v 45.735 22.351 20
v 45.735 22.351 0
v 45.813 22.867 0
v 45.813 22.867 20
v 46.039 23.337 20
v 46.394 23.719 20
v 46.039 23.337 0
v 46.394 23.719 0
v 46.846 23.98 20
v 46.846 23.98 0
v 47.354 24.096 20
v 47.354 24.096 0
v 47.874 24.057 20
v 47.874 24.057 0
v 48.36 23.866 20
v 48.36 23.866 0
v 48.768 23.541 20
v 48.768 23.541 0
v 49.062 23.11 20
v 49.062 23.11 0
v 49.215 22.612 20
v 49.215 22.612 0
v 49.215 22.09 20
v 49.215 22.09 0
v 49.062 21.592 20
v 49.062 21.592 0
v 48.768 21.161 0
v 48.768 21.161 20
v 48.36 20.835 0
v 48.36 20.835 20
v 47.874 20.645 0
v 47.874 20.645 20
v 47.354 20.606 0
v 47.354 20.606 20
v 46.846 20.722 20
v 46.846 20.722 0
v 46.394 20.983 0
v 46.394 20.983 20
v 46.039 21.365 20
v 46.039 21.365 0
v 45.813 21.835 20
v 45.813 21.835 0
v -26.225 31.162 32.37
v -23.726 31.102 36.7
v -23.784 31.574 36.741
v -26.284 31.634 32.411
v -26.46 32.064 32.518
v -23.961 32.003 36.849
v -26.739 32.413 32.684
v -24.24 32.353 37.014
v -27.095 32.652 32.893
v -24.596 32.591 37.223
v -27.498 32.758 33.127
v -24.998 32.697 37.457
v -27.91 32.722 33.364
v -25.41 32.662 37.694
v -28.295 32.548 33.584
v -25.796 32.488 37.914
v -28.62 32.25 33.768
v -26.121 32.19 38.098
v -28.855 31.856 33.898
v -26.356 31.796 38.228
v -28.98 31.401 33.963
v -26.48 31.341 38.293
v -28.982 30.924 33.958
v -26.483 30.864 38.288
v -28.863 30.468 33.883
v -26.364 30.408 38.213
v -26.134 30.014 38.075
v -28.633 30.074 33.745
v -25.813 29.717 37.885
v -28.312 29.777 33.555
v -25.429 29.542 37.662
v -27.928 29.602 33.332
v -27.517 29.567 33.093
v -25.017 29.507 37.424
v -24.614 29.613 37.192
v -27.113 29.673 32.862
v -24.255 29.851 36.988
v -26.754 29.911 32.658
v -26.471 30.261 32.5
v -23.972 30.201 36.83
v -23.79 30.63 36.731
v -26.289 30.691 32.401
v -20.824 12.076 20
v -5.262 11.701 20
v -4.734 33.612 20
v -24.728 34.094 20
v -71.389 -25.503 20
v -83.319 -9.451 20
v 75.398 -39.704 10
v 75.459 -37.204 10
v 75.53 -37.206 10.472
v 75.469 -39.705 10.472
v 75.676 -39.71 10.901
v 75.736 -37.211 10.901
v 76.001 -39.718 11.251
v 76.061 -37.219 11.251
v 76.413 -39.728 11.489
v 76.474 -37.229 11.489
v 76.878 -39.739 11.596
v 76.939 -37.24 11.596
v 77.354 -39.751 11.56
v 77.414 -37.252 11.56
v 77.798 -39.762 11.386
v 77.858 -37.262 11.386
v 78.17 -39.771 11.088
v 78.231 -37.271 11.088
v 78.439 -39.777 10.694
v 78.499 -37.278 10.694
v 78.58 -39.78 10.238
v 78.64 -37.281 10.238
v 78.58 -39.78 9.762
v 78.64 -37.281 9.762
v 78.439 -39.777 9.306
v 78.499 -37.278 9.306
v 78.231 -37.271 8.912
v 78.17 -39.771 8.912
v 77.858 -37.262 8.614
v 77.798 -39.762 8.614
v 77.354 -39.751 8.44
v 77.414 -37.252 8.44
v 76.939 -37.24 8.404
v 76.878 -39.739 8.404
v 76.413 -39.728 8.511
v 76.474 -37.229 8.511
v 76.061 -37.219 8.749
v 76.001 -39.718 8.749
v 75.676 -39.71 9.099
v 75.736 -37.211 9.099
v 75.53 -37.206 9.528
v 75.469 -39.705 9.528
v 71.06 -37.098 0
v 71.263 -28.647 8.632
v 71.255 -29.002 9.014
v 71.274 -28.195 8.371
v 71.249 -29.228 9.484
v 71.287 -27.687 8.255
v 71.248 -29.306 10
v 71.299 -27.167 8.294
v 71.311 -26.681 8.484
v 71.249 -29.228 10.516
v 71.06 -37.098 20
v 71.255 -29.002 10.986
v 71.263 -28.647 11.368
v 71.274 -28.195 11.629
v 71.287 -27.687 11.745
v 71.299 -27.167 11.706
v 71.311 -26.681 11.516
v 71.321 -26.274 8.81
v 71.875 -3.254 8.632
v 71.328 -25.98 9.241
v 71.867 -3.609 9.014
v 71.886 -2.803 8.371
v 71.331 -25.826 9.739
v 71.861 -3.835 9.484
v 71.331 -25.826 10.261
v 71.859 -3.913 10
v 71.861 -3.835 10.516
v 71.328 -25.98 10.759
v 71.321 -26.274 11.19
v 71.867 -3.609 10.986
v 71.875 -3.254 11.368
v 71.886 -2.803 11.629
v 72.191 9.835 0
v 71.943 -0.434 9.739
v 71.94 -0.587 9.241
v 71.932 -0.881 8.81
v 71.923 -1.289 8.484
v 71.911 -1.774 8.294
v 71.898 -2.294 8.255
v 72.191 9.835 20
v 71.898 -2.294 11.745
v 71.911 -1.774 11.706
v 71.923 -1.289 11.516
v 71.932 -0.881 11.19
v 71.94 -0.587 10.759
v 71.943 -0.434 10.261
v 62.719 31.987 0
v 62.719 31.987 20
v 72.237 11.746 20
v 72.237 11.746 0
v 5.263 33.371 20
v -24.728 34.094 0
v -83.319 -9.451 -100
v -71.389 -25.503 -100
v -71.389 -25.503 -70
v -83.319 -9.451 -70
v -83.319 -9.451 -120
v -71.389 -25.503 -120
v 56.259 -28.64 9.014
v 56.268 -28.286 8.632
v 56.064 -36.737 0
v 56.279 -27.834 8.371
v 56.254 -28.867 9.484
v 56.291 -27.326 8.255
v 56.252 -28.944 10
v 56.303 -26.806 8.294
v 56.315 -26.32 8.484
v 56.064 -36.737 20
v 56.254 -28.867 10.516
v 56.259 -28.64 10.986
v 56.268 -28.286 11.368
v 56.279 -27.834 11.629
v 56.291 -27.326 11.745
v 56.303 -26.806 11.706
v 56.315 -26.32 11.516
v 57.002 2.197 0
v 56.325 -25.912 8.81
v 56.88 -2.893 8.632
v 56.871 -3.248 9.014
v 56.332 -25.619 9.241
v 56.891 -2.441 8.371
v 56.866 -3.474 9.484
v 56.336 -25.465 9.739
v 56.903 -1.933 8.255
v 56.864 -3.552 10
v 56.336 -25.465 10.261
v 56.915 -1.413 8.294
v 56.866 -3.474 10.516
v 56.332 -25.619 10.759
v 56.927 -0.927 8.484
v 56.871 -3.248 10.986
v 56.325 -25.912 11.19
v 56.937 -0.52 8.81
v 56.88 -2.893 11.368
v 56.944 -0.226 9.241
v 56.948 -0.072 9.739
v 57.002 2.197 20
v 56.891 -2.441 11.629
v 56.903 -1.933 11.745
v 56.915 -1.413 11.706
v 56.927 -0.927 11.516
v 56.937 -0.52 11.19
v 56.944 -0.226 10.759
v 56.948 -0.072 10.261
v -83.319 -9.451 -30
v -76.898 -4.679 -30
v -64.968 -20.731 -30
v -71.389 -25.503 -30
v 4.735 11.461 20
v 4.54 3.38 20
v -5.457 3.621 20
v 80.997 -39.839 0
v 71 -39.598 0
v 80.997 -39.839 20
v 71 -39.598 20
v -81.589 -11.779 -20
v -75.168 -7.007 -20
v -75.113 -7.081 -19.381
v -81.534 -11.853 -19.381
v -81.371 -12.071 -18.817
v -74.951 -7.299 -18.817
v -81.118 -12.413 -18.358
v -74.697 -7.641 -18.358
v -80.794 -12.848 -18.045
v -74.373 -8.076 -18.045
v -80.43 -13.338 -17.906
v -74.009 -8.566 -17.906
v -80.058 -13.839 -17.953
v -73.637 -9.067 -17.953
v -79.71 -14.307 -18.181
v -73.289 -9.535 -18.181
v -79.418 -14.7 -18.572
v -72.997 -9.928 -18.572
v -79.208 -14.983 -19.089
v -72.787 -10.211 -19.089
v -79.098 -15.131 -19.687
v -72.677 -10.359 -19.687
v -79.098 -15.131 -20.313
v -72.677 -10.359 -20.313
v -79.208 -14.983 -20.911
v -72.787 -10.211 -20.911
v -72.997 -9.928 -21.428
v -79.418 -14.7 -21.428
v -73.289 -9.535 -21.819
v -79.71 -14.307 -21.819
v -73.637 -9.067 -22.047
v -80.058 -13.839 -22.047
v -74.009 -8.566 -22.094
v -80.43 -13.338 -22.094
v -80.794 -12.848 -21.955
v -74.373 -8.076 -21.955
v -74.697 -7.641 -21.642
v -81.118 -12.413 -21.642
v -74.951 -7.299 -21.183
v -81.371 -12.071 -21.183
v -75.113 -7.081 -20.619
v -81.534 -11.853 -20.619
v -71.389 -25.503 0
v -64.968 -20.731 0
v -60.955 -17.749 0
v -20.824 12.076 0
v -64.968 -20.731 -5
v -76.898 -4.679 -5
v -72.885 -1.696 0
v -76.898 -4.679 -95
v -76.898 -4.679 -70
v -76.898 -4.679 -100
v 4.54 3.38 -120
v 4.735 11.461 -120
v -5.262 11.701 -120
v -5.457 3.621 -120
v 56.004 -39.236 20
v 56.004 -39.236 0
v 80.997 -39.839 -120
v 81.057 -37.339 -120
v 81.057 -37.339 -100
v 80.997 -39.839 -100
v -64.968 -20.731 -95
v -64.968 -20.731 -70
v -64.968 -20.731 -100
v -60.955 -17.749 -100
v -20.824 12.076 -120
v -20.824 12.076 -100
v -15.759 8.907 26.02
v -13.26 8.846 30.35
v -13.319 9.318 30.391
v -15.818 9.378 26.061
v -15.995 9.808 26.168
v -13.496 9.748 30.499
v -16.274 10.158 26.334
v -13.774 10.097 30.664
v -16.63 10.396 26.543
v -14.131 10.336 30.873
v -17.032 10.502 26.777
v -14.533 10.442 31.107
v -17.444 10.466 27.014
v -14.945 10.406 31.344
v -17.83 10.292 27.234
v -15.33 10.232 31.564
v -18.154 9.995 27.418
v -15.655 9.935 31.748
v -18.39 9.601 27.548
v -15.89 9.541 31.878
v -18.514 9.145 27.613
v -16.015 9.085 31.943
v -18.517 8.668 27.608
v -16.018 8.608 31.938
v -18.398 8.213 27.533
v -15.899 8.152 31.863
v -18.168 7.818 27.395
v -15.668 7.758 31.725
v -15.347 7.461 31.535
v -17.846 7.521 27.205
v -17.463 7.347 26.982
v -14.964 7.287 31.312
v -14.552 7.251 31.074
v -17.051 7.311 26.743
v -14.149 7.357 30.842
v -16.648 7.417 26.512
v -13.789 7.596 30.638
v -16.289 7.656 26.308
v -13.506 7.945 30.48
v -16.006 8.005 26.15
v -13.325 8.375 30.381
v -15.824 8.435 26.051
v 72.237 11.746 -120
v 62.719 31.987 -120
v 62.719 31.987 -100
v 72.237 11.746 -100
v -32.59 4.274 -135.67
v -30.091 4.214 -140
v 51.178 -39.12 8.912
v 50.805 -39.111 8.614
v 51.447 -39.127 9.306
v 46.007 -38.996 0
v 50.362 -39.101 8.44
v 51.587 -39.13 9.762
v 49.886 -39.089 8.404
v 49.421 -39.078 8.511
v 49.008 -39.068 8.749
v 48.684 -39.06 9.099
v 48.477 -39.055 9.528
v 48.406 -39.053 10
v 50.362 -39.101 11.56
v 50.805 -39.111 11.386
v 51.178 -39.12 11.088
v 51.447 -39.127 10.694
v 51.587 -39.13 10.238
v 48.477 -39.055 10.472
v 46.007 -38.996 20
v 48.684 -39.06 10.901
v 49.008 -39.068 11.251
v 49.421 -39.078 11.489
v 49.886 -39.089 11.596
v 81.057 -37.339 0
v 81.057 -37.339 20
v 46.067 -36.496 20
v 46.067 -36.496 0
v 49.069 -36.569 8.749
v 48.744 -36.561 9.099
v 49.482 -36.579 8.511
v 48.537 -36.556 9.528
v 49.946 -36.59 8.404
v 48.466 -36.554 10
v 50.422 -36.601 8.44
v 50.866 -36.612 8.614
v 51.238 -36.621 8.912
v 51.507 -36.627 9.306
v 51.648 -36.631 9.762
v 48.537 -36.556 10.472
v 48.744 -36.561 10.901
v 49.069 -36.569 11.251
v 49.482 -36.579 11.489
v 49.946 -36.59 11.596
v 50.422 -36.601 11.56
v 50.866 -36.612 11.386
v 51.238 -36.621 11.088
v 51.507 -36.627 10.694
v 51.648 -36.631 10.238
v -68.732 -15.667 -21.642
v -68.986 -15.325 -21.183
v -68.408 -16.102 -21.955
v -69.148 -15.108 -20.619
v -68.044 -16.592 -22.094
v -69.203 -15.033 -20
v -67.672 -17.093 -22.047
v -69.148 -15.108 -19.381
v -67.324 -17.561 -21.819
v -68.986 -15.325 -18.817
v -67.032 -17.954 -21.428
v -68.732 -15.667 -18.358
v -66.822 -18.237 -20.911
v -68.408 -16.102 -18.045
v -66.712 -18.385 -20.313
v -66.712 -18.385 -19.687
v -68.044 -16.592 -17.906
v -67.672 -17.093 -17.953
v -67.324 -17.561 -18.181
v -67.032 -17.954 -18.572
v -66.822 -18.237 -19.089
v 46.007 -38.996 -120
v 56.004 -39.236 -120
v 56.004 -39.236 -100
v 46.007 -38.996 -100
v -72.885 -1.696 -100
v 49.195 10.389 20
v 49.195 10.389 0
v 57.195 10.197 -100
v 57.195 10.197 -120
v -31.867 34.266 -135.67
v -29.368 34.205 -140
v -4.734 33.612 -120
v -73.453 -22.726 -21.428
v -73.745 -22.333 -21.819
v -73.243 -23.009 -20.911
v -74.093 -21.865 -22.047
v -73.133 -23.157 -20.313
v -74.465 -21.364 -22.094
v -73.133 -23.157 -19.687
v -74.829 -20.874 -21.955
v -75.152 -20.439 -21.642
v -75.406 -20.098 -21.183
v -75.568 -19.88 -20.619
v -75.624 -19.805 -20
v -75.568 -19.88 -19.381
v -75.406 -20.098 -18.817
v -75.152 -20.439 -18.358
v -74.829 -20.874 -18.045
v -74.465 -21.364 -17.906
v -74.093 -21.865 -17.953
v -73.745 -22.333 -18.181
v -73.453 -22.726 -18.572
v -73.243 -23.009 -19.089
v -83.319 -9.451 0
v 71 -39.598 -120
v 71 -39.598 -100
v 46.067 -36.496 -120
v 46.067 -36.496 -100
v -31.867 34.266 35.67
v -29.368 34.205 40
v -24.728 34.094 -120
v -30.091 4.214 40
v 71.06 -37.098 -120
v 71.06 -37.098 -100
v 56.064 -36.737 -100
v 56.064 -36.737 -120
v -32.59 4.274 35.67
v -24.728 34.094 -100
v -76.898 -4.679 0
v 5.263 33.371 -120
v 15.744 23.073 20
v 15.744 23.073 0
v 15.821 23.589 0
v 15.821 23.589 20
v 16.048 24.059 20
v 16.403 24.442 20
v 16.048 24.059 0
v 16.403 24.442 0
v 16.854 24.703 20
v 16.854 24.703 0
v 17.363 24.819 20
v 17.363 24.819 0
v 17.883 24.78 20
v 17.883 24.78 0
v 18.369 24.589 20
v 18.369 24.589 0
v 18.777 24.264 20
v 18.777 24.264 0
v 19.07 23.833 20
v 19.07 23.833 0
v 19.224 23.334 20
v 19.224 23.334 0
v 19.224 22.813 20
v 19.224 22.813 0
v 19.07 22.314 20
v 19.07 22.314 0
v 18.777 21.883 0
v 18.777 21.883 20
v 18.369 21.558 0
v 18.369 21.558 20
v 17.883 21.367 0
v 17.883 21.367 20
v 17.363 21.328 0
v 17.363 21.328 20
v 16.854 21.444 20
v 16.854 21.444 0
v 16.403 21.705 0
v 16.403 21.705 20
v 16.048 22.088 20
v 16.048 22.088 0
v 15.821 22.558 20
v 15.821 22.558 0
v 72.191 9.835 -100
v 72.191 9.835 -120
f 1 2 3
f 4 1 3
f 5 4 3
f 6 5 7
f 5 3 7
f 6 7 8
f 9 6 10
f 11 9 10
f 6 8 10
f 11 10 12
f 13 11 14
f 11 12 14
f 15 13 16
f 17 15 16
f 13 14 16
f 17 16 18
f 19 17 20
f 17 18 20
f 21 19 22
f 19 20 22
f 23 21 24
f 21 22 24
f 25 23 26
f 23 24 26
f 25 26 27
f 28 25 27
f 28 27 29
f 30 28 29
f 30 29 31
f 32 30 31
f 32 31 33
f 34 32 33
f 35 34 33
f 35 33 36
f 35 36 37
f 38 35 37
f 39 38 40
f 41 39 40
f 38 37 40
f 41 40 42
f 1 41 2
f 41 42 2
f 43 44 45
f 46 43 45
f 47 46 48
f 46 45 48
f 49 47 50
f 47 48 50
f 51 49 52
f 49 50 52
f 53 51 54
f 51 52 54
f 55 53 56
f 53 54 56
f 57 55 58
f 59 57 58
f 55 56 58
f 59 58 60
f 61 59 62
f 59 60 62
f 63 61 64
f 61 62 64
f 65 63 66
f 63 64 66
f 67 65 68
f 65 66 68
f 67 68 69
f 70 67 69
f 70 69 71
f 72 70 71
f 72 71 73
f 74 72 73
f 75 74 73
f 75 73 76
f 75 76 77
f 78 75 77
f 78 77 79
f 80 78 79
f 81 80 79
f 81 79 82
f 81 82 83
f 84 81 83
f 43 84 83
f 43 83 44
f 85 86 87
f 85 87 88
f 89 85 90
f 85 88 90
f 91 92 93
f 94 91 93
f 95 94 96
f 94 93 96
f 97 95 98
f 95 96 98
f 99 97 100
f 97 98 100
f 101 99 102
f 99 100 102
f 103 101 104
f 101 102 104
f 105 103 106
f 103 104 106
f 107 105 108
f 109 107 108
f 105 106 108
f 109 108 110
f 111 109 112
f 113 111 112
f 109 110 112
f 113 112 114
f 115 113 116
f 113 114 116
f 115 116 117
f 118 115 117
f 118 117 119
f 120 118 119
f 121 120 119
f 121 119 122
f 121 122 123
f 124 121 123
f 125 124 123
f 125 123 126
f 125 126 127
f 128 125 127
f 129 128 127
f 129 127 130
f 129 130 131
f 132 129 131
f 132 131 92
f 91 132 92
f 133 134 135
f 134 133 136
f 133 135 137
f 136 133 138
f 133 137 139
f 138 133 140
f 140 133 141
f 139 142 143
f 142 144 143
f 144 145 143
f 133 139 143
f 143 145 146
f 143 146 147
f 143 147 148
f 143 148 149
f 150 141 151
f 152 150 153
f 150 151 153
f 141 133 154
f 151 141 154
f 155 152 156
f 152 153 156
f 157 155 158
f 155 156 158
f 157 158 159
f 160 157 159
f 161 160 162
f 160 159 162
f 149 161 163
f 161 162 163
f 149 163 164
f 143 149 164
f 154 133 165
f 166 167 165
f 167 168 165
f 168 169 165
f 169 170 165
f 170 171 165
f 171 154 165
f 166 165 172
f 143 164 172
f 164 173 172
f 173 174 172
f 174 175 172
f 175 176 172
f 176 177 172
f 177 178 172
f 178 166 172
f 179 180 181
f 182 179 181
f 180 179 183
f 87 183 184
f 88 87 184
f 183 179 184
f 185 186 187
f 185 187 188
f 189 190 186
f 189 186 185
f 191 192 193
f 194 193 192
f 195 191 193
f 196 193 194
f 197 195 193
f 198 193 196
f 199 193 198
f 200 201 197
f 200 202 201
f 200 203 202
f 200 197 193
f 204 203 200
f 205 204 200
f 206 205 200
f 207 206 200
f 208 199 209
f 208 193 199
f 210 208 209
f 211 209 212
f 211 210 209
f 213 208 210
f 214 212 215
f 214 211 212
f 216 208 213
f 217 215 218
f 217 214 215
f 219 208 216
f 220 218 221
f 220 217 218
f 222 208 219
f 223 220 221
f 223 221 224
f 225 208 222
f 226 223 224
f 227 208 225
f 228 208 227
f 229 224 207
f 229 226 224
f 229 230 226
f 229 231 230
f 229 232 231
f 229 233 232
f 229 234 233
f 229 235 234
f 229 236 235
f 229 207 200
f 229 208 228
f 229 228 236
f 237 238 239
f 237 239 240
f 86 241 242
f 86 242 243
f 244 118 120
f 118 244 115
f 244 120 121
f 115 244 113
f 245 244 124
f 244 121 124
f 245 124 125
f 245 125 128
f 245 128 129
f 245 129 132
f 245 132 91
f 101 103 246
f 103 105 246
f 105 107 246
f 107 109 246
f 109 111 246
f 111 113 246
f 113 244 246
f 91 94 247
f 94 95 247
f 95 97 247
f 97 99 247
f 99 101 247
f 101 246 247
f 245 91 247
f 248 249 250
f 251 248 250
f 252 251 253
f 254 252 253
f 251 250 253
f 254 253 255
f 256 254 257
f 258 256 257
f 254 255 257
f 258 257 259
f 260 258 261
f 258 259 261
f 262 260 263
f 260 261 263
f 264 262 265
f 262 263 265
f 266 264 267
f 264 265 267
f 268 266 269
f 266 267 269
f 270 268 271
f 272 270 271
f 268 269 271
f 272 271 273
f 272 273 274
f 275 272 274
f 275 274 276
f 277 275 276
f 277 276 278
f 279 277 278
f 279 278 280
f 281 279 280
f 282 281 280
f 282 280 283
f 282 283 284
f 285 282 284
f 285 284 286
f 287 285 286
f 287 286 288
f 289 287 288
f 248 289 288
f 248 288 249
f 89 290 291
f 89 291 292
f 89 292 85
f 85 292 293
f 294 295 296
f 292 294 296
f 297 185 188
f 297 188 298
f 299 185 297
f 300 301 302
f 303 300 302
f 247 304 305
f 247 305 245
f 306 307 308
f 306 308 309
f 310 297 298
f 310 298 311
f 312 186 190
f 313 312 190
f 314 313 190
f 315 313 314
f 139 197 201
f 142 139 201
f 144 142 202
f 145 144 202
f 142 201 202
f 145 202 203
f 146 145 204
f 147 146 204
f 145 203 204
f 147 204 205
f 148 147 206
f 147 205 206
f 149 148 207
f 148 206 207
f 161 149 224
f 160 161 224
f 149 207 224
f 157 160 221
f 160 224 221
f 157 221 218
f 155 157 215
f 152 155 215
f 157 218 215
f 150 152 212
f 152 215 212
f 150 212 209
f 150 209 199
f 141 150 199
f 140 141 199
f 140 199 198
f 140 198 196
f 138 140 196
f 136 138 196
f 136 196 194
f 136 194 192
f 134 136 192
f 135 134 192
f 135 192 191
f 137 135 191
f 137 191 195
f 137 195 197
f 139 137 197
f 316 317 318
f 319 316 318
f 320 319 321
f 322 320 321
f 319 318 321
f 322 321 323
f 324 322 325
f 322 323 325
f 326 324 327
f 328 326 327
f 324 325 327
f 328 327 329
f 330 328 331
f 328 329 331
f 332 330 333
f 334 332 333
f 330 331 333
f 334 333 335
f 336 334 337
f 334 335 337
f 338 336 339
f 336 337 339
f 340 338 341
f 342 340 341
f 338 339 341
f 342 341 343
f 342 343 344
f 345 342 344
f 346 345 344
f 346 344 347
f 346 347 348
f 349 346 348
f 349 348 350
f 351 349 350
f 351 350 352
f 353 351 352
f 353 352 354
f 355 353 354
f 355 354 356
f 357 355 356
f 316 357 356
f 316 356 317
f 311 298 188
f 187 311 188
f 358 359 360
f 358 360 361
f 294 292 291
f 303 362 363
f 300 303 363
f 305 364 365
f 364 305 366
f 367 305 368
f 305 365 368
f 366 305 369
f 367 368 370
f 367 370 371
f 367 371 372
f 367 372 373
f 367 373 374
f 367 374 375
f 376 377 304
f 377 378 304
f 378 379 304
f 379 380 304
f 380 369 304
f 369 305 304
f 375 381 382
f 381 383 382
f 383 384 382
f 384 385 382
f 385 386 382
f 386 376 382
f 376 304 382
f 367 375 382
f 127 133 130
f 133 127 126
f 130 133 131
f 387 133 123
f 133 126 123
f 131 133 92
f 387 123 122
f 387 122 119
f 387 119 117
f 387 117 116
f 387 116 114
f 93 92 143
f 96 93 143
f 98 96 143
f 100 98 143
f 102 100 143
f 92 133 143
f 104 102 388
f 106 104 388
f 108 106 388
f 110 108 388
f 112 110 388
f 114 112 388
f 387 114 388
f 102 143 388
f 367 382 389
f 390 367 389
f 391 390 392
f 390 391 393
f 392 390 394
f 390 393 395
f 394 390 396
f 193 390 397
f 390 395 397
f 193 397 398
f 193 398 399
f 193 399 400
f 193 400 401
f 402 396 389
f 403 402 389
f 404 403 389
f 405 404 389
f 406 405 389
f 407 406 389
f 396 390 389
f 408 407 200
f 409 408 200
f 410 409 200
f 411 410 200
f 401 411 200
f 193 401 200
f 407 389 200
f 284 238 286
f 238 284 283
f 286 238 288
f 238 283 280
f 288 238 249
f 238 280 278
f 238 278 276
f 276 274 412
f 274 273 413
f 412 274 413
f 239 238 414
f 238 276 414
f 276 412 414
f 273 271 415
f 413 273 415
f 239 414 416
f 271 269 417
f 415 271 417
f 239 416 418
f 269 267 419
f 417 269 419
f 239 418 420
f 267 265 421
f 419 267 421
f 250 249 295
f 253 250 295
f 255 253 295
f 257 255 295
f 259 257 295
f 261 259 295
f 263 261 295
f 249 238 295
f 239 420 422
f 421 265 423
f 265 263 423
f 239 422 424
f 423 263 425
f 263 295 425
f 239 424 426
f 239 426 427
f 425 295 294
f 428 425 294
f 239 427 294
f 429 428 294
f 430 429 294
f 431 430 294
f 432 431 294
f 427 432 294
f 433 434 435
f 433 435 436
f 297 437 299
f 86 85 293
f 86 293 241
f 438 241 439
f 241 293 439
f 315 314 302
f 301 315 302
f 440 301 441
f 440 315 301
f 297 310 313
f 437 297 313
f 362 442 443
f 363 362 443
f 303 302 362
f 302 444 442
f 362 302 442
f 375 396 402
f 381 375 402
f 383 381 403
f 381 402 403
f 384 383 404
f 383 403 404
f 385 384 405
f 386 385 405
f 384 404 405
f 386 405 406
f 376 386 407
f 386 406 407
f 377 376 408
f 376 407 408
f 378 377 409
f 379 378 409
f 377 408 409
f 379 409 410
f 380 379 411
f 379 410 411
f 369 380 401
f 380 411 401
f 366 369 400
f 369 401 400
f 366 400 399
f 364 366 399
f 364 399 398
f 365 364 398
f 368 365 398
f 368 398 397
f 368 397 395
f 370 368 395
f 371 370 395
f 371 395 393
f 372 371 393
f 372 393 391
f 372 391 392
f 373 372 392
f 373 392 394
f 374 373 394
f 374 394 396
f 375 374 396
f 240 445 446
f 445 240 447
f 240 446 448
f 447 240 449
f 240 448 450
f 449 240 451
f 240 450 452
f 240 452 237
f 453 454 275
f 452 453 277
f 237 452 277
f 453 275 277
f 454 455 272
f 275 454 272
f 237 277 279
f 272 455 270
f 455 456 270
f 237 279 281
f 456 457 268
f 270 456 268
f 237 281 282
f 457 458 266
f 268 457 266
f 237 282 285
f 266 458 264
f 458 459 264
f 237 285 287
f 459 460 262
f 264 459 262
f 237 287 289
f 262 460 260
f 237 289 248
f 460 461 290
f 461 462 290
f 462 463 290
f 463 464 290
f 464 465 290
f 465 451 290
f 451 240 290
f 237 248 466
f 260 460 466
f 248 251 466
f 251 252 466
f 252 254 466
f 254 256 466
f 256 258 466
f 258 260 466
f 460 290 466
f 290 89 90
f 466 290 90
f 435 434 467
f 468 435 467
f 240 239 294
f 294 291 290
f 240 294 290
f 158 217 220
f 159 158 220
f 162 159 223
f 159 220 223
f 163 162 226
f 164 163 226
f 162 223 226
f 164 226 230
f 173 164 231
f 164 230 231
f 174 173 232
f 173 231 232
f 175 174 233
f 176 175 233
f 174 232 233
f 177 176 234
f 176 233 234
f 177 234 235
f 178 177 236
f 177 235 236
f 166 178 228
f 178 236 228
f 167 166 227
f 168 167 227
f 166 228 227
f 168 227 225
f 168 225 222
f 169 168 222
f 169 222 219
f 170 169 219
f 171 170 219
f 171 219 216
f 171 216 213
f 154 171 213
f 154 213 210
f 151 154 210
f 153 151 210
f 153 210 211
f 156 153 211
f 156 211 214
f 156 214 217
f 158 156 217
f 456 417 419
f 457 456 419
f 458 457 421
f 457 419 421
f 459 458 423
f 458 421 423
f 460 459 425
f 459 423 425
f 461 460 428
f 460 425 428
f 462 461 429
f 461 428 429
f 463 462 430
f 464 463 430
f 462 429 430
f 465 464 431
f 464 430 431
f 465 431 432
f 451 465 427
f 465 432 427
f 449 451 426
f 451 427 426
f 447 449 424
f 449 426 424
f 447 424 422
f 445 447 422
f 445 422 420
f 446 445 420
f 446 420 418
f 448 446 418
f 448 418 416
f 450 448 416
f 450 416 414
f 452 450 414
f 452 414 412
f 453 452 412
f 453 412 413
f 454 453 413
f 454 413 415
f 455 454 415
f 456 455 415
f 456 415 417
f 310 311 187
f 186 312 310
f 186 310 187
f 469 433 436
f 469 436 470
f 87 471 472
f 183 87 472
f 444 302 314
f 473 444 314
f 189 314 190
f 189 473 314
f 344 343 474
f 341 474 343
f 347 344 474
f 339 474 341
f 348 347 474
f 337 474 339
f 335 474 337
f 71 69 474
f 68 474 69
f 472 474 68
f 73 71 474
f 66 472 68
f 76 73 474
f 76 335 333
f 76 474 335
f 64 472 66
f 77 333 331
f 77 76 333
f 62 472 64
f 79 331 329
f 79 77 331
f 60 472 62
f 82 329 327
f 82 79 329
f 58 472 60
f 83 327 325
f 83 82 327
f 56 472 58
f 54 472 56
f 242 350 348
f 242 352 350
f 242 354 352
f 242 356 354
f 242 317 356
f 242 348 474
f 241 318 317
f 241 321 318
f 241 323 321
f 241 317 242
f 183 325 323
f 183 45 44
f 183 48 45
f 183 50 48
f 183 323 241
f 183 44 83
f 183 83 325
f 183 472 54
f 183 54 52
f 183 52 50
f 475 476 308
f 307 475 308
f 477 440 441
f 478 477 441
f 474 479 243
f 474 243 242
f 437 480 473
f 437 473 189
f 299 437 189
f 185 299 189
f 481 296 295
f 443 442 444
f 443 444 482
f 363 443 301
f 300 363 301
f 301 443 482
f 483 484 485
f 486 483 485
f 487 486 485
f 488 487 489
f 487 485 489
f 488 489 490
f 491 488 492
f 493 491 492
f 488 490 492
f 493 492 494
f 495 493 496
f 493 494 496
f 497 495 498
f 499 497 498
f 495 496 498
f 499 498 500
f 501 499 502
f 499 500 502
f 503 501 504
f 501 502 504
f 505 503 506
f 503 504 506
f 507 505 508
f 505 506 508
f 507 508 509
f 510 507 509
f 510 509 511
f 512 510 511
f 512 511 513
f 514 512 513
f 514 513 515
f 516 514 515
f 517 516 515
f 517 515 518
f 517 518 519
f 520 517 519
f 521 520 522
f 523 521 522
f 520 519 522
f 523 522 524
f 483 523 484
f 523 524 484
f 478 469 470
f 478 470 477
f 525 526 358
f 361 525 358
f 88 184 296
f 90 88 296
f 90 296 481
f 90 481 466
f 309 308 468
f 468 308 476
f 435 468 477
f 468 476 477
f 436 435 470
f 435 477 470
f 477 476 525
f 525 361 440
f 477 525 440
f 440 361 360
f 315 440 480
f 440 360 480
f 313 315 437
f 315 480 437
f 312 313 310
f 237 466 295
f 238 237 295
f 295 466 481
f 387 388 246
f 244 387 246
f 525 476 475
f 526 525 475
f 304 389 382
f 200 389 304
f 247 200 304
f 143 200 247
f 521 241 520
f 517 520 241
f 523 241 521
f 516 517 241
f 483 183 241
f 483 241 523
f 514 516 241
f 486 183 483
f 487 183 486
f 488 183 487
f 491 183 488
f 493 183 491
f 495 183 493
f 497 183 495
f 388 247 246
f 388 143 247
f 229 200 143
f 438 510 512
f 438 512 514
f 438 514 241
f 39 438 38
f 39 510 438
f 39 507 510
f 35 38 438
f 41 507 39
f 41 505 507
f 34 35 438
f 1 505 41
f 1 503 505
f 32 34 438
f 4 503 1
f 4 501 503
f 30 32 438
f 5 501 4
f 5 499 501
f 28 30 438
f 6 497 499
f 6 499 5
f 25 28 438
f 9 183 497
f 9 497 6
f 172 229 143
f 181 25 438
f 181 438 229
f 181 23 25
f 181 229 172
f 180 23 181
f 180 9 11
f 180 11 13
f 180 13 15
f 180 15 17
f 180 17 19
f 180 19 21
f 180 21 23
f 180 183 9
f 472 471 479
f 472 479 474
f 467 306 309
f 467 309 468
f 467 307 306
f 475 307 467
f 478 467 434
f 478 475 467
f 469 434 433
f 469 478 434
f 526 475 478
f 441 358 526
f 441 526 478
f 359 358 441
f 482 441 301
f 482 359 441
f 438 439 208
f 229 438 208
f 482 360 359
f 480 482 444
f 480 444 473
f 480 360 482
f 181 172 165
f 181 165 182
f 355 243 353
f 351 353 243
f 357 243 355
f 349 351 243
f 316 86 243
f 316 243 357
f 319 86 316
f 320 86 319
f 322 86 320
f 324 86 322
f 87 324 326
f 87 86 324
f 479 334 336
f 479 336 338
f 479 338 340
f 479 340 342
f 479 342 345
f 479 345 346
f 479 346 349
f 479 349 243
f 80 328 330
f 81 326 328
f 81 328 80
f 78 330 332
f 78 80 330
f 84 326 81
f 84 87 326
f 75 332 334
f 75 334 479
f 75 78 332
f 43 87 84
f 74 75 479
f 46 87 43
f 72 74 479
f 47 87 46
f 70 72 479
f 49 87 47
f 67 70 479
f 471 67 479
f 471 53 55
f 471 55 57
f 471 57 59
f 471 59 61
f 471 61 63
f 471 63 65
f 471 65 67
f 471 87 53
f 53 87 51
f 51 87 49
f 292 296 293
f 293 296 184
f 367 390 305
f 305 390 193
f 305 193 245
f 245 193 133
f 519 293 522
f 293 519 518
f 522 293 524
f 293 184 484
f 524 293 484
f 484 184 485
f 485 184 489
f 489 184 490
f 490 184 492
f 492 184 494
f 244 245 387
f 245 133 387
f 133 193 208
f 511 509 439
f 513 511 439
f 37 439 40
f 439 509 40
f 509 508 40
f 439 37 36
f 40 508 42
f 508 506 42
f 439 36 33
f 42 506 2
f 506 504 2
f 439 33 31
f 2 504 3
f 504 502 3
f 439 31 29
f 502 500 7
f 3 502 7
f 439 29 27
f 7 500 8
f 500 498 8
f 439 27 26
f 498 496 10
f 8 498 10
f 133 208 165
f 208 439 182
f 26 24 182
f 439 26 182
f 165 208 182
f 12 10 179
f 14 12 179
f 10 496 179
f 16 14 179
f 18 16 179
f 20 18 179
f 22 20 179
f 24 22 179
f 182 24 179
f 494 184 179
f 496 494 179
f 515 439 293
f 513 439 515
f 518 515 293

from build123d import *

# Parameters (mm, degrees)
EXTRUDE_1_DEPTH     = 20
EXTRUDE_2_DEPTH     = 30
EXTRUDE_3_DEPTH     = 20
SKETCH_4_W          = 15
SKETCH_4_H          = 20
EXTRUDE_4_DEPTH     = 49.447425698
EXTRUDE_5_DEPTH     = 20
CUT_EXTRUDE_1_DEPTH = 30
EXTRUDE_6_DEPTH     = 30
EXTRUDE_7_DEPTH     = 20
SKETCH_9_R          = 1.6
CUT_EXTRUDE_2_DEPTH = 10
SKETCH_10_R         = 2.1
CUT_EXTRUDE_3_DEPTH = 10
SKETCH_11_R         = 1.75
CUT_EXTRUDE_4_DEPTH = 202.855572154
SKETCH_12_R         = 1.6
CUT_EXTRUDE_5_DEPTH = 10
SKETCH_13_R         = 1.75
CUT_EXTRUDE_7_DEPTH = 20


with BuildPart() as part:
    # 草图1 → 凸台-拉伸1 (new body)
    with BuildSketch(Plane.XY):
        Polygon((-24.728355126, 34.093691019), (-83.319008043, -9.450945744), (-71.388970574, -25.50317942), (-20.824434495, 12.076438608), (72.190663405, 9.835314871), (72.718578523, 31.745785774), align=None)
    extrude(amount=EXTRUDE_1_DEPTH)

    # 草图2 → 凸台-拉伸2 (add)
    with BuildSketch(Plane(origin=(0, 0, 0), x_dir=(-1, 0, 0), z_dir=(0, 0, -1))):
        Polygon((71.388970574, -25.50317942), (83.319008043, -9.450945744), (76.898114573, -4.678930756), (64.968077103, -20.731164432), align=None)
    extrude(amount=EXTRUDE_2_DEPTH)

    # 草图3 → 凸台-拉伸3 (add)
    with BuildSketch(Plane(origin=(-25.121381082, 33.801593702, 0), x_dir=(0.8026116837907572, 0.5965018734610694, 0), z_dir=(-0.5965018734610694, 0.8026116837907572, 0))):
        Polygon((-64.510316179, 5), (-59.510316179, 0), (-64.510316179, 0), align=None)
    extrude(amount=-EXTRUDE_3_DEPTH)

    # 草图4 → 凸台-拉伸4 (add)
    with BuildSketch(Plane(origin=(0.278721027, 11.567975102, 0), x_dir=(0.9997098612470757, -0.024087202522351275, 0), z_dir=(-0.024087202522351272, -0.9997098612470756, 0))):
        with Locations((64.432812874, 10)):
            Rectangle(SKETCH_4_W, SKETCH_4_H)
    extrude(amount=EXTRUDE_4_DEPTH)

    # 草图5 → 凸台-拉伸5 (add)
    with BuildSketch(Plane.XY.offset(20)):
        Polygon((46.006866716, -38.99558415), (46.067084723, -36.496309497), (81.056929866, -37.339361585), (80.99671186, -39.838636238), align=None)
    extrude(amount=-EXTRUDE_5_DEPTH)

    # 草图6 → 切除-拉伸1 (cut)
    with BuildSketch(Plane.XY.offset(20)):
        Polygon((62.718578523, 31.986727706), (72.23669466, 11.745785774), (72.718578523, 31.745785774), align=None)
    extrude(amount=-CUT_EXTRUDE_1_DEPTH, mode=Mode.SUBTRACT)

    # 草图7 → 凸台-拉伸6 (add)
    with BuildSketch(Plane(origin=(0.806636145, 33.478446006, 0), x_dir=(0.9997098612470757, -0.02408720252235126, 0), z_dir=(0.024087202522351258, 0.9997098612470756, 0))):
        Polygon((-5.542402112, -20), (-32.683418264, -35.669872981), (-30.183418264, -40), (4.457597888, -20), align=None)
    extrude(amount=-EXTRUDE_6_DEPTH)


with BuildPart() as body_2:
    # 镜向4: mirrored copy
    add(part.part.mirror(Plane(origin=(0, 0, -50), x_dir=(1, 0, 0), z_dir=(0, 0, -1))))


with BuildPart() as part_1:
    add(part.part)

    # 草图8 → 凸台-拉伸7 (add)
    with BuildSketch(Plane.XY.offset(20)):
        Polygon((49.195015486, 10.389376454), (57.00226194, 2.196622908), (57.195015486, 10.196622908), align=None)
    extrude(amount=-EXTRUDE_7_DEPTH)

    # 草图9 → 切除-拉伸2 (cut)
    with BuildSketch(Plane(origin=(-0.852111124, -35.365829328, 0), x_dir=(0.9997098612470757, -0.02408720252235112, 0), z_dir=(0.024087202522351116, 0.9997098612470756, 0))):
        with Locations(Location((77.932812874, -10, 0), (0, 0, 180))):
            Circle(SKETCH_9_R)
        with Locations(Location((50.932812874, -10, 0), (0, 0, 180))):
            Circle(SKETCH_9_R)
    extrude(amount=-CUT_EXTRUDE_2_DEPTH, mode=Mode.SUBTRACT)

    # 草图10 → 切除-拉伸3 (cut)
    with BuildSketch(Plane(origin=(-51.776733491, -38.480524459, 0), x_dir=(0, 0, -1), z_dir=(0.8026116837907572, 0.5965018734610693, 0))):
        with Locations(Location((20, 37.114504915, 0), (0, 0, 90))):
            Circle(SKETCH_10_R)
        with Locations(Location((20, 27.114504915, 0), (0, 0, 90))):
            Circle(SKETCH_10_R)
    extrude(amount=-CUT_EXTRUDE_3_DEPTH, mode=Mode.SUBTRACT)

    # 草图11 → 切除-拉伸4 (cut, through all)
    with BuildSketch(Plane(origin=(56.916294459, -1.371352194, 0), x_dir=(0, 0, 1), z_dir=(-0.9997098612470756, 0.024087202522351286, 0))):
        with Locations(Location((10, -0.430989389, 0), (0, 0, 270))):
            Circle(SKETCH_11_R)
        with Locations(Location((10, -25.830989389, 0), (0, 0, 270))):
            Circle(SKETCH_11_R)
    extrude(amount=-CUT_EXTRUDE_4_DEPTH, mode=Mode.SUBTRACT)

    # 草图12 → 切除-拉伸5 (cut)
    with BuildSketch(Plane(origin=(9.771817504, -0.235444059, 16.930196505), x_dir=(0.8661091434290129, 0.006950686894989351, -0.4998066022176473), z_dir=(0.4998549306235377, -0.012043601261175624, 0.8660254037844388))):
        with Locations(Location((-40.275793685, 31.620495598, 0), (0, 0, 359.601722883))):
            Circle(SKETCH_12_R)
        with Locations(Location((-28.192461779, 9.278761331, 0), (0, 0, 359.601722883))):
            Circle(SKETCH_12_R)
    extrude(amount=-CUT_EXTRUDE_5_DEPTH, mode=Mode.SUBTRACT)

    # 草图13 → 切除-拉伸7 (cut)
    with BuildSketch(Plane(origin=(0, 0, 0), x_dir=(-1, 0, 0), z_dir=(0, 0, -1))):
        with Locations((-47.484959967, 22.350867225)):
            Circle(SKETCH_13_R)
        with Locations((-17.493664129, 23.0734833)):
            Circle(SKETCH_13_R)
    extrude(amount=-CUT_EXTRUDE_7_DEPTH, mode=Mode.SUBTRACT)


solid = Compound([body_2.part, part_1.part])
